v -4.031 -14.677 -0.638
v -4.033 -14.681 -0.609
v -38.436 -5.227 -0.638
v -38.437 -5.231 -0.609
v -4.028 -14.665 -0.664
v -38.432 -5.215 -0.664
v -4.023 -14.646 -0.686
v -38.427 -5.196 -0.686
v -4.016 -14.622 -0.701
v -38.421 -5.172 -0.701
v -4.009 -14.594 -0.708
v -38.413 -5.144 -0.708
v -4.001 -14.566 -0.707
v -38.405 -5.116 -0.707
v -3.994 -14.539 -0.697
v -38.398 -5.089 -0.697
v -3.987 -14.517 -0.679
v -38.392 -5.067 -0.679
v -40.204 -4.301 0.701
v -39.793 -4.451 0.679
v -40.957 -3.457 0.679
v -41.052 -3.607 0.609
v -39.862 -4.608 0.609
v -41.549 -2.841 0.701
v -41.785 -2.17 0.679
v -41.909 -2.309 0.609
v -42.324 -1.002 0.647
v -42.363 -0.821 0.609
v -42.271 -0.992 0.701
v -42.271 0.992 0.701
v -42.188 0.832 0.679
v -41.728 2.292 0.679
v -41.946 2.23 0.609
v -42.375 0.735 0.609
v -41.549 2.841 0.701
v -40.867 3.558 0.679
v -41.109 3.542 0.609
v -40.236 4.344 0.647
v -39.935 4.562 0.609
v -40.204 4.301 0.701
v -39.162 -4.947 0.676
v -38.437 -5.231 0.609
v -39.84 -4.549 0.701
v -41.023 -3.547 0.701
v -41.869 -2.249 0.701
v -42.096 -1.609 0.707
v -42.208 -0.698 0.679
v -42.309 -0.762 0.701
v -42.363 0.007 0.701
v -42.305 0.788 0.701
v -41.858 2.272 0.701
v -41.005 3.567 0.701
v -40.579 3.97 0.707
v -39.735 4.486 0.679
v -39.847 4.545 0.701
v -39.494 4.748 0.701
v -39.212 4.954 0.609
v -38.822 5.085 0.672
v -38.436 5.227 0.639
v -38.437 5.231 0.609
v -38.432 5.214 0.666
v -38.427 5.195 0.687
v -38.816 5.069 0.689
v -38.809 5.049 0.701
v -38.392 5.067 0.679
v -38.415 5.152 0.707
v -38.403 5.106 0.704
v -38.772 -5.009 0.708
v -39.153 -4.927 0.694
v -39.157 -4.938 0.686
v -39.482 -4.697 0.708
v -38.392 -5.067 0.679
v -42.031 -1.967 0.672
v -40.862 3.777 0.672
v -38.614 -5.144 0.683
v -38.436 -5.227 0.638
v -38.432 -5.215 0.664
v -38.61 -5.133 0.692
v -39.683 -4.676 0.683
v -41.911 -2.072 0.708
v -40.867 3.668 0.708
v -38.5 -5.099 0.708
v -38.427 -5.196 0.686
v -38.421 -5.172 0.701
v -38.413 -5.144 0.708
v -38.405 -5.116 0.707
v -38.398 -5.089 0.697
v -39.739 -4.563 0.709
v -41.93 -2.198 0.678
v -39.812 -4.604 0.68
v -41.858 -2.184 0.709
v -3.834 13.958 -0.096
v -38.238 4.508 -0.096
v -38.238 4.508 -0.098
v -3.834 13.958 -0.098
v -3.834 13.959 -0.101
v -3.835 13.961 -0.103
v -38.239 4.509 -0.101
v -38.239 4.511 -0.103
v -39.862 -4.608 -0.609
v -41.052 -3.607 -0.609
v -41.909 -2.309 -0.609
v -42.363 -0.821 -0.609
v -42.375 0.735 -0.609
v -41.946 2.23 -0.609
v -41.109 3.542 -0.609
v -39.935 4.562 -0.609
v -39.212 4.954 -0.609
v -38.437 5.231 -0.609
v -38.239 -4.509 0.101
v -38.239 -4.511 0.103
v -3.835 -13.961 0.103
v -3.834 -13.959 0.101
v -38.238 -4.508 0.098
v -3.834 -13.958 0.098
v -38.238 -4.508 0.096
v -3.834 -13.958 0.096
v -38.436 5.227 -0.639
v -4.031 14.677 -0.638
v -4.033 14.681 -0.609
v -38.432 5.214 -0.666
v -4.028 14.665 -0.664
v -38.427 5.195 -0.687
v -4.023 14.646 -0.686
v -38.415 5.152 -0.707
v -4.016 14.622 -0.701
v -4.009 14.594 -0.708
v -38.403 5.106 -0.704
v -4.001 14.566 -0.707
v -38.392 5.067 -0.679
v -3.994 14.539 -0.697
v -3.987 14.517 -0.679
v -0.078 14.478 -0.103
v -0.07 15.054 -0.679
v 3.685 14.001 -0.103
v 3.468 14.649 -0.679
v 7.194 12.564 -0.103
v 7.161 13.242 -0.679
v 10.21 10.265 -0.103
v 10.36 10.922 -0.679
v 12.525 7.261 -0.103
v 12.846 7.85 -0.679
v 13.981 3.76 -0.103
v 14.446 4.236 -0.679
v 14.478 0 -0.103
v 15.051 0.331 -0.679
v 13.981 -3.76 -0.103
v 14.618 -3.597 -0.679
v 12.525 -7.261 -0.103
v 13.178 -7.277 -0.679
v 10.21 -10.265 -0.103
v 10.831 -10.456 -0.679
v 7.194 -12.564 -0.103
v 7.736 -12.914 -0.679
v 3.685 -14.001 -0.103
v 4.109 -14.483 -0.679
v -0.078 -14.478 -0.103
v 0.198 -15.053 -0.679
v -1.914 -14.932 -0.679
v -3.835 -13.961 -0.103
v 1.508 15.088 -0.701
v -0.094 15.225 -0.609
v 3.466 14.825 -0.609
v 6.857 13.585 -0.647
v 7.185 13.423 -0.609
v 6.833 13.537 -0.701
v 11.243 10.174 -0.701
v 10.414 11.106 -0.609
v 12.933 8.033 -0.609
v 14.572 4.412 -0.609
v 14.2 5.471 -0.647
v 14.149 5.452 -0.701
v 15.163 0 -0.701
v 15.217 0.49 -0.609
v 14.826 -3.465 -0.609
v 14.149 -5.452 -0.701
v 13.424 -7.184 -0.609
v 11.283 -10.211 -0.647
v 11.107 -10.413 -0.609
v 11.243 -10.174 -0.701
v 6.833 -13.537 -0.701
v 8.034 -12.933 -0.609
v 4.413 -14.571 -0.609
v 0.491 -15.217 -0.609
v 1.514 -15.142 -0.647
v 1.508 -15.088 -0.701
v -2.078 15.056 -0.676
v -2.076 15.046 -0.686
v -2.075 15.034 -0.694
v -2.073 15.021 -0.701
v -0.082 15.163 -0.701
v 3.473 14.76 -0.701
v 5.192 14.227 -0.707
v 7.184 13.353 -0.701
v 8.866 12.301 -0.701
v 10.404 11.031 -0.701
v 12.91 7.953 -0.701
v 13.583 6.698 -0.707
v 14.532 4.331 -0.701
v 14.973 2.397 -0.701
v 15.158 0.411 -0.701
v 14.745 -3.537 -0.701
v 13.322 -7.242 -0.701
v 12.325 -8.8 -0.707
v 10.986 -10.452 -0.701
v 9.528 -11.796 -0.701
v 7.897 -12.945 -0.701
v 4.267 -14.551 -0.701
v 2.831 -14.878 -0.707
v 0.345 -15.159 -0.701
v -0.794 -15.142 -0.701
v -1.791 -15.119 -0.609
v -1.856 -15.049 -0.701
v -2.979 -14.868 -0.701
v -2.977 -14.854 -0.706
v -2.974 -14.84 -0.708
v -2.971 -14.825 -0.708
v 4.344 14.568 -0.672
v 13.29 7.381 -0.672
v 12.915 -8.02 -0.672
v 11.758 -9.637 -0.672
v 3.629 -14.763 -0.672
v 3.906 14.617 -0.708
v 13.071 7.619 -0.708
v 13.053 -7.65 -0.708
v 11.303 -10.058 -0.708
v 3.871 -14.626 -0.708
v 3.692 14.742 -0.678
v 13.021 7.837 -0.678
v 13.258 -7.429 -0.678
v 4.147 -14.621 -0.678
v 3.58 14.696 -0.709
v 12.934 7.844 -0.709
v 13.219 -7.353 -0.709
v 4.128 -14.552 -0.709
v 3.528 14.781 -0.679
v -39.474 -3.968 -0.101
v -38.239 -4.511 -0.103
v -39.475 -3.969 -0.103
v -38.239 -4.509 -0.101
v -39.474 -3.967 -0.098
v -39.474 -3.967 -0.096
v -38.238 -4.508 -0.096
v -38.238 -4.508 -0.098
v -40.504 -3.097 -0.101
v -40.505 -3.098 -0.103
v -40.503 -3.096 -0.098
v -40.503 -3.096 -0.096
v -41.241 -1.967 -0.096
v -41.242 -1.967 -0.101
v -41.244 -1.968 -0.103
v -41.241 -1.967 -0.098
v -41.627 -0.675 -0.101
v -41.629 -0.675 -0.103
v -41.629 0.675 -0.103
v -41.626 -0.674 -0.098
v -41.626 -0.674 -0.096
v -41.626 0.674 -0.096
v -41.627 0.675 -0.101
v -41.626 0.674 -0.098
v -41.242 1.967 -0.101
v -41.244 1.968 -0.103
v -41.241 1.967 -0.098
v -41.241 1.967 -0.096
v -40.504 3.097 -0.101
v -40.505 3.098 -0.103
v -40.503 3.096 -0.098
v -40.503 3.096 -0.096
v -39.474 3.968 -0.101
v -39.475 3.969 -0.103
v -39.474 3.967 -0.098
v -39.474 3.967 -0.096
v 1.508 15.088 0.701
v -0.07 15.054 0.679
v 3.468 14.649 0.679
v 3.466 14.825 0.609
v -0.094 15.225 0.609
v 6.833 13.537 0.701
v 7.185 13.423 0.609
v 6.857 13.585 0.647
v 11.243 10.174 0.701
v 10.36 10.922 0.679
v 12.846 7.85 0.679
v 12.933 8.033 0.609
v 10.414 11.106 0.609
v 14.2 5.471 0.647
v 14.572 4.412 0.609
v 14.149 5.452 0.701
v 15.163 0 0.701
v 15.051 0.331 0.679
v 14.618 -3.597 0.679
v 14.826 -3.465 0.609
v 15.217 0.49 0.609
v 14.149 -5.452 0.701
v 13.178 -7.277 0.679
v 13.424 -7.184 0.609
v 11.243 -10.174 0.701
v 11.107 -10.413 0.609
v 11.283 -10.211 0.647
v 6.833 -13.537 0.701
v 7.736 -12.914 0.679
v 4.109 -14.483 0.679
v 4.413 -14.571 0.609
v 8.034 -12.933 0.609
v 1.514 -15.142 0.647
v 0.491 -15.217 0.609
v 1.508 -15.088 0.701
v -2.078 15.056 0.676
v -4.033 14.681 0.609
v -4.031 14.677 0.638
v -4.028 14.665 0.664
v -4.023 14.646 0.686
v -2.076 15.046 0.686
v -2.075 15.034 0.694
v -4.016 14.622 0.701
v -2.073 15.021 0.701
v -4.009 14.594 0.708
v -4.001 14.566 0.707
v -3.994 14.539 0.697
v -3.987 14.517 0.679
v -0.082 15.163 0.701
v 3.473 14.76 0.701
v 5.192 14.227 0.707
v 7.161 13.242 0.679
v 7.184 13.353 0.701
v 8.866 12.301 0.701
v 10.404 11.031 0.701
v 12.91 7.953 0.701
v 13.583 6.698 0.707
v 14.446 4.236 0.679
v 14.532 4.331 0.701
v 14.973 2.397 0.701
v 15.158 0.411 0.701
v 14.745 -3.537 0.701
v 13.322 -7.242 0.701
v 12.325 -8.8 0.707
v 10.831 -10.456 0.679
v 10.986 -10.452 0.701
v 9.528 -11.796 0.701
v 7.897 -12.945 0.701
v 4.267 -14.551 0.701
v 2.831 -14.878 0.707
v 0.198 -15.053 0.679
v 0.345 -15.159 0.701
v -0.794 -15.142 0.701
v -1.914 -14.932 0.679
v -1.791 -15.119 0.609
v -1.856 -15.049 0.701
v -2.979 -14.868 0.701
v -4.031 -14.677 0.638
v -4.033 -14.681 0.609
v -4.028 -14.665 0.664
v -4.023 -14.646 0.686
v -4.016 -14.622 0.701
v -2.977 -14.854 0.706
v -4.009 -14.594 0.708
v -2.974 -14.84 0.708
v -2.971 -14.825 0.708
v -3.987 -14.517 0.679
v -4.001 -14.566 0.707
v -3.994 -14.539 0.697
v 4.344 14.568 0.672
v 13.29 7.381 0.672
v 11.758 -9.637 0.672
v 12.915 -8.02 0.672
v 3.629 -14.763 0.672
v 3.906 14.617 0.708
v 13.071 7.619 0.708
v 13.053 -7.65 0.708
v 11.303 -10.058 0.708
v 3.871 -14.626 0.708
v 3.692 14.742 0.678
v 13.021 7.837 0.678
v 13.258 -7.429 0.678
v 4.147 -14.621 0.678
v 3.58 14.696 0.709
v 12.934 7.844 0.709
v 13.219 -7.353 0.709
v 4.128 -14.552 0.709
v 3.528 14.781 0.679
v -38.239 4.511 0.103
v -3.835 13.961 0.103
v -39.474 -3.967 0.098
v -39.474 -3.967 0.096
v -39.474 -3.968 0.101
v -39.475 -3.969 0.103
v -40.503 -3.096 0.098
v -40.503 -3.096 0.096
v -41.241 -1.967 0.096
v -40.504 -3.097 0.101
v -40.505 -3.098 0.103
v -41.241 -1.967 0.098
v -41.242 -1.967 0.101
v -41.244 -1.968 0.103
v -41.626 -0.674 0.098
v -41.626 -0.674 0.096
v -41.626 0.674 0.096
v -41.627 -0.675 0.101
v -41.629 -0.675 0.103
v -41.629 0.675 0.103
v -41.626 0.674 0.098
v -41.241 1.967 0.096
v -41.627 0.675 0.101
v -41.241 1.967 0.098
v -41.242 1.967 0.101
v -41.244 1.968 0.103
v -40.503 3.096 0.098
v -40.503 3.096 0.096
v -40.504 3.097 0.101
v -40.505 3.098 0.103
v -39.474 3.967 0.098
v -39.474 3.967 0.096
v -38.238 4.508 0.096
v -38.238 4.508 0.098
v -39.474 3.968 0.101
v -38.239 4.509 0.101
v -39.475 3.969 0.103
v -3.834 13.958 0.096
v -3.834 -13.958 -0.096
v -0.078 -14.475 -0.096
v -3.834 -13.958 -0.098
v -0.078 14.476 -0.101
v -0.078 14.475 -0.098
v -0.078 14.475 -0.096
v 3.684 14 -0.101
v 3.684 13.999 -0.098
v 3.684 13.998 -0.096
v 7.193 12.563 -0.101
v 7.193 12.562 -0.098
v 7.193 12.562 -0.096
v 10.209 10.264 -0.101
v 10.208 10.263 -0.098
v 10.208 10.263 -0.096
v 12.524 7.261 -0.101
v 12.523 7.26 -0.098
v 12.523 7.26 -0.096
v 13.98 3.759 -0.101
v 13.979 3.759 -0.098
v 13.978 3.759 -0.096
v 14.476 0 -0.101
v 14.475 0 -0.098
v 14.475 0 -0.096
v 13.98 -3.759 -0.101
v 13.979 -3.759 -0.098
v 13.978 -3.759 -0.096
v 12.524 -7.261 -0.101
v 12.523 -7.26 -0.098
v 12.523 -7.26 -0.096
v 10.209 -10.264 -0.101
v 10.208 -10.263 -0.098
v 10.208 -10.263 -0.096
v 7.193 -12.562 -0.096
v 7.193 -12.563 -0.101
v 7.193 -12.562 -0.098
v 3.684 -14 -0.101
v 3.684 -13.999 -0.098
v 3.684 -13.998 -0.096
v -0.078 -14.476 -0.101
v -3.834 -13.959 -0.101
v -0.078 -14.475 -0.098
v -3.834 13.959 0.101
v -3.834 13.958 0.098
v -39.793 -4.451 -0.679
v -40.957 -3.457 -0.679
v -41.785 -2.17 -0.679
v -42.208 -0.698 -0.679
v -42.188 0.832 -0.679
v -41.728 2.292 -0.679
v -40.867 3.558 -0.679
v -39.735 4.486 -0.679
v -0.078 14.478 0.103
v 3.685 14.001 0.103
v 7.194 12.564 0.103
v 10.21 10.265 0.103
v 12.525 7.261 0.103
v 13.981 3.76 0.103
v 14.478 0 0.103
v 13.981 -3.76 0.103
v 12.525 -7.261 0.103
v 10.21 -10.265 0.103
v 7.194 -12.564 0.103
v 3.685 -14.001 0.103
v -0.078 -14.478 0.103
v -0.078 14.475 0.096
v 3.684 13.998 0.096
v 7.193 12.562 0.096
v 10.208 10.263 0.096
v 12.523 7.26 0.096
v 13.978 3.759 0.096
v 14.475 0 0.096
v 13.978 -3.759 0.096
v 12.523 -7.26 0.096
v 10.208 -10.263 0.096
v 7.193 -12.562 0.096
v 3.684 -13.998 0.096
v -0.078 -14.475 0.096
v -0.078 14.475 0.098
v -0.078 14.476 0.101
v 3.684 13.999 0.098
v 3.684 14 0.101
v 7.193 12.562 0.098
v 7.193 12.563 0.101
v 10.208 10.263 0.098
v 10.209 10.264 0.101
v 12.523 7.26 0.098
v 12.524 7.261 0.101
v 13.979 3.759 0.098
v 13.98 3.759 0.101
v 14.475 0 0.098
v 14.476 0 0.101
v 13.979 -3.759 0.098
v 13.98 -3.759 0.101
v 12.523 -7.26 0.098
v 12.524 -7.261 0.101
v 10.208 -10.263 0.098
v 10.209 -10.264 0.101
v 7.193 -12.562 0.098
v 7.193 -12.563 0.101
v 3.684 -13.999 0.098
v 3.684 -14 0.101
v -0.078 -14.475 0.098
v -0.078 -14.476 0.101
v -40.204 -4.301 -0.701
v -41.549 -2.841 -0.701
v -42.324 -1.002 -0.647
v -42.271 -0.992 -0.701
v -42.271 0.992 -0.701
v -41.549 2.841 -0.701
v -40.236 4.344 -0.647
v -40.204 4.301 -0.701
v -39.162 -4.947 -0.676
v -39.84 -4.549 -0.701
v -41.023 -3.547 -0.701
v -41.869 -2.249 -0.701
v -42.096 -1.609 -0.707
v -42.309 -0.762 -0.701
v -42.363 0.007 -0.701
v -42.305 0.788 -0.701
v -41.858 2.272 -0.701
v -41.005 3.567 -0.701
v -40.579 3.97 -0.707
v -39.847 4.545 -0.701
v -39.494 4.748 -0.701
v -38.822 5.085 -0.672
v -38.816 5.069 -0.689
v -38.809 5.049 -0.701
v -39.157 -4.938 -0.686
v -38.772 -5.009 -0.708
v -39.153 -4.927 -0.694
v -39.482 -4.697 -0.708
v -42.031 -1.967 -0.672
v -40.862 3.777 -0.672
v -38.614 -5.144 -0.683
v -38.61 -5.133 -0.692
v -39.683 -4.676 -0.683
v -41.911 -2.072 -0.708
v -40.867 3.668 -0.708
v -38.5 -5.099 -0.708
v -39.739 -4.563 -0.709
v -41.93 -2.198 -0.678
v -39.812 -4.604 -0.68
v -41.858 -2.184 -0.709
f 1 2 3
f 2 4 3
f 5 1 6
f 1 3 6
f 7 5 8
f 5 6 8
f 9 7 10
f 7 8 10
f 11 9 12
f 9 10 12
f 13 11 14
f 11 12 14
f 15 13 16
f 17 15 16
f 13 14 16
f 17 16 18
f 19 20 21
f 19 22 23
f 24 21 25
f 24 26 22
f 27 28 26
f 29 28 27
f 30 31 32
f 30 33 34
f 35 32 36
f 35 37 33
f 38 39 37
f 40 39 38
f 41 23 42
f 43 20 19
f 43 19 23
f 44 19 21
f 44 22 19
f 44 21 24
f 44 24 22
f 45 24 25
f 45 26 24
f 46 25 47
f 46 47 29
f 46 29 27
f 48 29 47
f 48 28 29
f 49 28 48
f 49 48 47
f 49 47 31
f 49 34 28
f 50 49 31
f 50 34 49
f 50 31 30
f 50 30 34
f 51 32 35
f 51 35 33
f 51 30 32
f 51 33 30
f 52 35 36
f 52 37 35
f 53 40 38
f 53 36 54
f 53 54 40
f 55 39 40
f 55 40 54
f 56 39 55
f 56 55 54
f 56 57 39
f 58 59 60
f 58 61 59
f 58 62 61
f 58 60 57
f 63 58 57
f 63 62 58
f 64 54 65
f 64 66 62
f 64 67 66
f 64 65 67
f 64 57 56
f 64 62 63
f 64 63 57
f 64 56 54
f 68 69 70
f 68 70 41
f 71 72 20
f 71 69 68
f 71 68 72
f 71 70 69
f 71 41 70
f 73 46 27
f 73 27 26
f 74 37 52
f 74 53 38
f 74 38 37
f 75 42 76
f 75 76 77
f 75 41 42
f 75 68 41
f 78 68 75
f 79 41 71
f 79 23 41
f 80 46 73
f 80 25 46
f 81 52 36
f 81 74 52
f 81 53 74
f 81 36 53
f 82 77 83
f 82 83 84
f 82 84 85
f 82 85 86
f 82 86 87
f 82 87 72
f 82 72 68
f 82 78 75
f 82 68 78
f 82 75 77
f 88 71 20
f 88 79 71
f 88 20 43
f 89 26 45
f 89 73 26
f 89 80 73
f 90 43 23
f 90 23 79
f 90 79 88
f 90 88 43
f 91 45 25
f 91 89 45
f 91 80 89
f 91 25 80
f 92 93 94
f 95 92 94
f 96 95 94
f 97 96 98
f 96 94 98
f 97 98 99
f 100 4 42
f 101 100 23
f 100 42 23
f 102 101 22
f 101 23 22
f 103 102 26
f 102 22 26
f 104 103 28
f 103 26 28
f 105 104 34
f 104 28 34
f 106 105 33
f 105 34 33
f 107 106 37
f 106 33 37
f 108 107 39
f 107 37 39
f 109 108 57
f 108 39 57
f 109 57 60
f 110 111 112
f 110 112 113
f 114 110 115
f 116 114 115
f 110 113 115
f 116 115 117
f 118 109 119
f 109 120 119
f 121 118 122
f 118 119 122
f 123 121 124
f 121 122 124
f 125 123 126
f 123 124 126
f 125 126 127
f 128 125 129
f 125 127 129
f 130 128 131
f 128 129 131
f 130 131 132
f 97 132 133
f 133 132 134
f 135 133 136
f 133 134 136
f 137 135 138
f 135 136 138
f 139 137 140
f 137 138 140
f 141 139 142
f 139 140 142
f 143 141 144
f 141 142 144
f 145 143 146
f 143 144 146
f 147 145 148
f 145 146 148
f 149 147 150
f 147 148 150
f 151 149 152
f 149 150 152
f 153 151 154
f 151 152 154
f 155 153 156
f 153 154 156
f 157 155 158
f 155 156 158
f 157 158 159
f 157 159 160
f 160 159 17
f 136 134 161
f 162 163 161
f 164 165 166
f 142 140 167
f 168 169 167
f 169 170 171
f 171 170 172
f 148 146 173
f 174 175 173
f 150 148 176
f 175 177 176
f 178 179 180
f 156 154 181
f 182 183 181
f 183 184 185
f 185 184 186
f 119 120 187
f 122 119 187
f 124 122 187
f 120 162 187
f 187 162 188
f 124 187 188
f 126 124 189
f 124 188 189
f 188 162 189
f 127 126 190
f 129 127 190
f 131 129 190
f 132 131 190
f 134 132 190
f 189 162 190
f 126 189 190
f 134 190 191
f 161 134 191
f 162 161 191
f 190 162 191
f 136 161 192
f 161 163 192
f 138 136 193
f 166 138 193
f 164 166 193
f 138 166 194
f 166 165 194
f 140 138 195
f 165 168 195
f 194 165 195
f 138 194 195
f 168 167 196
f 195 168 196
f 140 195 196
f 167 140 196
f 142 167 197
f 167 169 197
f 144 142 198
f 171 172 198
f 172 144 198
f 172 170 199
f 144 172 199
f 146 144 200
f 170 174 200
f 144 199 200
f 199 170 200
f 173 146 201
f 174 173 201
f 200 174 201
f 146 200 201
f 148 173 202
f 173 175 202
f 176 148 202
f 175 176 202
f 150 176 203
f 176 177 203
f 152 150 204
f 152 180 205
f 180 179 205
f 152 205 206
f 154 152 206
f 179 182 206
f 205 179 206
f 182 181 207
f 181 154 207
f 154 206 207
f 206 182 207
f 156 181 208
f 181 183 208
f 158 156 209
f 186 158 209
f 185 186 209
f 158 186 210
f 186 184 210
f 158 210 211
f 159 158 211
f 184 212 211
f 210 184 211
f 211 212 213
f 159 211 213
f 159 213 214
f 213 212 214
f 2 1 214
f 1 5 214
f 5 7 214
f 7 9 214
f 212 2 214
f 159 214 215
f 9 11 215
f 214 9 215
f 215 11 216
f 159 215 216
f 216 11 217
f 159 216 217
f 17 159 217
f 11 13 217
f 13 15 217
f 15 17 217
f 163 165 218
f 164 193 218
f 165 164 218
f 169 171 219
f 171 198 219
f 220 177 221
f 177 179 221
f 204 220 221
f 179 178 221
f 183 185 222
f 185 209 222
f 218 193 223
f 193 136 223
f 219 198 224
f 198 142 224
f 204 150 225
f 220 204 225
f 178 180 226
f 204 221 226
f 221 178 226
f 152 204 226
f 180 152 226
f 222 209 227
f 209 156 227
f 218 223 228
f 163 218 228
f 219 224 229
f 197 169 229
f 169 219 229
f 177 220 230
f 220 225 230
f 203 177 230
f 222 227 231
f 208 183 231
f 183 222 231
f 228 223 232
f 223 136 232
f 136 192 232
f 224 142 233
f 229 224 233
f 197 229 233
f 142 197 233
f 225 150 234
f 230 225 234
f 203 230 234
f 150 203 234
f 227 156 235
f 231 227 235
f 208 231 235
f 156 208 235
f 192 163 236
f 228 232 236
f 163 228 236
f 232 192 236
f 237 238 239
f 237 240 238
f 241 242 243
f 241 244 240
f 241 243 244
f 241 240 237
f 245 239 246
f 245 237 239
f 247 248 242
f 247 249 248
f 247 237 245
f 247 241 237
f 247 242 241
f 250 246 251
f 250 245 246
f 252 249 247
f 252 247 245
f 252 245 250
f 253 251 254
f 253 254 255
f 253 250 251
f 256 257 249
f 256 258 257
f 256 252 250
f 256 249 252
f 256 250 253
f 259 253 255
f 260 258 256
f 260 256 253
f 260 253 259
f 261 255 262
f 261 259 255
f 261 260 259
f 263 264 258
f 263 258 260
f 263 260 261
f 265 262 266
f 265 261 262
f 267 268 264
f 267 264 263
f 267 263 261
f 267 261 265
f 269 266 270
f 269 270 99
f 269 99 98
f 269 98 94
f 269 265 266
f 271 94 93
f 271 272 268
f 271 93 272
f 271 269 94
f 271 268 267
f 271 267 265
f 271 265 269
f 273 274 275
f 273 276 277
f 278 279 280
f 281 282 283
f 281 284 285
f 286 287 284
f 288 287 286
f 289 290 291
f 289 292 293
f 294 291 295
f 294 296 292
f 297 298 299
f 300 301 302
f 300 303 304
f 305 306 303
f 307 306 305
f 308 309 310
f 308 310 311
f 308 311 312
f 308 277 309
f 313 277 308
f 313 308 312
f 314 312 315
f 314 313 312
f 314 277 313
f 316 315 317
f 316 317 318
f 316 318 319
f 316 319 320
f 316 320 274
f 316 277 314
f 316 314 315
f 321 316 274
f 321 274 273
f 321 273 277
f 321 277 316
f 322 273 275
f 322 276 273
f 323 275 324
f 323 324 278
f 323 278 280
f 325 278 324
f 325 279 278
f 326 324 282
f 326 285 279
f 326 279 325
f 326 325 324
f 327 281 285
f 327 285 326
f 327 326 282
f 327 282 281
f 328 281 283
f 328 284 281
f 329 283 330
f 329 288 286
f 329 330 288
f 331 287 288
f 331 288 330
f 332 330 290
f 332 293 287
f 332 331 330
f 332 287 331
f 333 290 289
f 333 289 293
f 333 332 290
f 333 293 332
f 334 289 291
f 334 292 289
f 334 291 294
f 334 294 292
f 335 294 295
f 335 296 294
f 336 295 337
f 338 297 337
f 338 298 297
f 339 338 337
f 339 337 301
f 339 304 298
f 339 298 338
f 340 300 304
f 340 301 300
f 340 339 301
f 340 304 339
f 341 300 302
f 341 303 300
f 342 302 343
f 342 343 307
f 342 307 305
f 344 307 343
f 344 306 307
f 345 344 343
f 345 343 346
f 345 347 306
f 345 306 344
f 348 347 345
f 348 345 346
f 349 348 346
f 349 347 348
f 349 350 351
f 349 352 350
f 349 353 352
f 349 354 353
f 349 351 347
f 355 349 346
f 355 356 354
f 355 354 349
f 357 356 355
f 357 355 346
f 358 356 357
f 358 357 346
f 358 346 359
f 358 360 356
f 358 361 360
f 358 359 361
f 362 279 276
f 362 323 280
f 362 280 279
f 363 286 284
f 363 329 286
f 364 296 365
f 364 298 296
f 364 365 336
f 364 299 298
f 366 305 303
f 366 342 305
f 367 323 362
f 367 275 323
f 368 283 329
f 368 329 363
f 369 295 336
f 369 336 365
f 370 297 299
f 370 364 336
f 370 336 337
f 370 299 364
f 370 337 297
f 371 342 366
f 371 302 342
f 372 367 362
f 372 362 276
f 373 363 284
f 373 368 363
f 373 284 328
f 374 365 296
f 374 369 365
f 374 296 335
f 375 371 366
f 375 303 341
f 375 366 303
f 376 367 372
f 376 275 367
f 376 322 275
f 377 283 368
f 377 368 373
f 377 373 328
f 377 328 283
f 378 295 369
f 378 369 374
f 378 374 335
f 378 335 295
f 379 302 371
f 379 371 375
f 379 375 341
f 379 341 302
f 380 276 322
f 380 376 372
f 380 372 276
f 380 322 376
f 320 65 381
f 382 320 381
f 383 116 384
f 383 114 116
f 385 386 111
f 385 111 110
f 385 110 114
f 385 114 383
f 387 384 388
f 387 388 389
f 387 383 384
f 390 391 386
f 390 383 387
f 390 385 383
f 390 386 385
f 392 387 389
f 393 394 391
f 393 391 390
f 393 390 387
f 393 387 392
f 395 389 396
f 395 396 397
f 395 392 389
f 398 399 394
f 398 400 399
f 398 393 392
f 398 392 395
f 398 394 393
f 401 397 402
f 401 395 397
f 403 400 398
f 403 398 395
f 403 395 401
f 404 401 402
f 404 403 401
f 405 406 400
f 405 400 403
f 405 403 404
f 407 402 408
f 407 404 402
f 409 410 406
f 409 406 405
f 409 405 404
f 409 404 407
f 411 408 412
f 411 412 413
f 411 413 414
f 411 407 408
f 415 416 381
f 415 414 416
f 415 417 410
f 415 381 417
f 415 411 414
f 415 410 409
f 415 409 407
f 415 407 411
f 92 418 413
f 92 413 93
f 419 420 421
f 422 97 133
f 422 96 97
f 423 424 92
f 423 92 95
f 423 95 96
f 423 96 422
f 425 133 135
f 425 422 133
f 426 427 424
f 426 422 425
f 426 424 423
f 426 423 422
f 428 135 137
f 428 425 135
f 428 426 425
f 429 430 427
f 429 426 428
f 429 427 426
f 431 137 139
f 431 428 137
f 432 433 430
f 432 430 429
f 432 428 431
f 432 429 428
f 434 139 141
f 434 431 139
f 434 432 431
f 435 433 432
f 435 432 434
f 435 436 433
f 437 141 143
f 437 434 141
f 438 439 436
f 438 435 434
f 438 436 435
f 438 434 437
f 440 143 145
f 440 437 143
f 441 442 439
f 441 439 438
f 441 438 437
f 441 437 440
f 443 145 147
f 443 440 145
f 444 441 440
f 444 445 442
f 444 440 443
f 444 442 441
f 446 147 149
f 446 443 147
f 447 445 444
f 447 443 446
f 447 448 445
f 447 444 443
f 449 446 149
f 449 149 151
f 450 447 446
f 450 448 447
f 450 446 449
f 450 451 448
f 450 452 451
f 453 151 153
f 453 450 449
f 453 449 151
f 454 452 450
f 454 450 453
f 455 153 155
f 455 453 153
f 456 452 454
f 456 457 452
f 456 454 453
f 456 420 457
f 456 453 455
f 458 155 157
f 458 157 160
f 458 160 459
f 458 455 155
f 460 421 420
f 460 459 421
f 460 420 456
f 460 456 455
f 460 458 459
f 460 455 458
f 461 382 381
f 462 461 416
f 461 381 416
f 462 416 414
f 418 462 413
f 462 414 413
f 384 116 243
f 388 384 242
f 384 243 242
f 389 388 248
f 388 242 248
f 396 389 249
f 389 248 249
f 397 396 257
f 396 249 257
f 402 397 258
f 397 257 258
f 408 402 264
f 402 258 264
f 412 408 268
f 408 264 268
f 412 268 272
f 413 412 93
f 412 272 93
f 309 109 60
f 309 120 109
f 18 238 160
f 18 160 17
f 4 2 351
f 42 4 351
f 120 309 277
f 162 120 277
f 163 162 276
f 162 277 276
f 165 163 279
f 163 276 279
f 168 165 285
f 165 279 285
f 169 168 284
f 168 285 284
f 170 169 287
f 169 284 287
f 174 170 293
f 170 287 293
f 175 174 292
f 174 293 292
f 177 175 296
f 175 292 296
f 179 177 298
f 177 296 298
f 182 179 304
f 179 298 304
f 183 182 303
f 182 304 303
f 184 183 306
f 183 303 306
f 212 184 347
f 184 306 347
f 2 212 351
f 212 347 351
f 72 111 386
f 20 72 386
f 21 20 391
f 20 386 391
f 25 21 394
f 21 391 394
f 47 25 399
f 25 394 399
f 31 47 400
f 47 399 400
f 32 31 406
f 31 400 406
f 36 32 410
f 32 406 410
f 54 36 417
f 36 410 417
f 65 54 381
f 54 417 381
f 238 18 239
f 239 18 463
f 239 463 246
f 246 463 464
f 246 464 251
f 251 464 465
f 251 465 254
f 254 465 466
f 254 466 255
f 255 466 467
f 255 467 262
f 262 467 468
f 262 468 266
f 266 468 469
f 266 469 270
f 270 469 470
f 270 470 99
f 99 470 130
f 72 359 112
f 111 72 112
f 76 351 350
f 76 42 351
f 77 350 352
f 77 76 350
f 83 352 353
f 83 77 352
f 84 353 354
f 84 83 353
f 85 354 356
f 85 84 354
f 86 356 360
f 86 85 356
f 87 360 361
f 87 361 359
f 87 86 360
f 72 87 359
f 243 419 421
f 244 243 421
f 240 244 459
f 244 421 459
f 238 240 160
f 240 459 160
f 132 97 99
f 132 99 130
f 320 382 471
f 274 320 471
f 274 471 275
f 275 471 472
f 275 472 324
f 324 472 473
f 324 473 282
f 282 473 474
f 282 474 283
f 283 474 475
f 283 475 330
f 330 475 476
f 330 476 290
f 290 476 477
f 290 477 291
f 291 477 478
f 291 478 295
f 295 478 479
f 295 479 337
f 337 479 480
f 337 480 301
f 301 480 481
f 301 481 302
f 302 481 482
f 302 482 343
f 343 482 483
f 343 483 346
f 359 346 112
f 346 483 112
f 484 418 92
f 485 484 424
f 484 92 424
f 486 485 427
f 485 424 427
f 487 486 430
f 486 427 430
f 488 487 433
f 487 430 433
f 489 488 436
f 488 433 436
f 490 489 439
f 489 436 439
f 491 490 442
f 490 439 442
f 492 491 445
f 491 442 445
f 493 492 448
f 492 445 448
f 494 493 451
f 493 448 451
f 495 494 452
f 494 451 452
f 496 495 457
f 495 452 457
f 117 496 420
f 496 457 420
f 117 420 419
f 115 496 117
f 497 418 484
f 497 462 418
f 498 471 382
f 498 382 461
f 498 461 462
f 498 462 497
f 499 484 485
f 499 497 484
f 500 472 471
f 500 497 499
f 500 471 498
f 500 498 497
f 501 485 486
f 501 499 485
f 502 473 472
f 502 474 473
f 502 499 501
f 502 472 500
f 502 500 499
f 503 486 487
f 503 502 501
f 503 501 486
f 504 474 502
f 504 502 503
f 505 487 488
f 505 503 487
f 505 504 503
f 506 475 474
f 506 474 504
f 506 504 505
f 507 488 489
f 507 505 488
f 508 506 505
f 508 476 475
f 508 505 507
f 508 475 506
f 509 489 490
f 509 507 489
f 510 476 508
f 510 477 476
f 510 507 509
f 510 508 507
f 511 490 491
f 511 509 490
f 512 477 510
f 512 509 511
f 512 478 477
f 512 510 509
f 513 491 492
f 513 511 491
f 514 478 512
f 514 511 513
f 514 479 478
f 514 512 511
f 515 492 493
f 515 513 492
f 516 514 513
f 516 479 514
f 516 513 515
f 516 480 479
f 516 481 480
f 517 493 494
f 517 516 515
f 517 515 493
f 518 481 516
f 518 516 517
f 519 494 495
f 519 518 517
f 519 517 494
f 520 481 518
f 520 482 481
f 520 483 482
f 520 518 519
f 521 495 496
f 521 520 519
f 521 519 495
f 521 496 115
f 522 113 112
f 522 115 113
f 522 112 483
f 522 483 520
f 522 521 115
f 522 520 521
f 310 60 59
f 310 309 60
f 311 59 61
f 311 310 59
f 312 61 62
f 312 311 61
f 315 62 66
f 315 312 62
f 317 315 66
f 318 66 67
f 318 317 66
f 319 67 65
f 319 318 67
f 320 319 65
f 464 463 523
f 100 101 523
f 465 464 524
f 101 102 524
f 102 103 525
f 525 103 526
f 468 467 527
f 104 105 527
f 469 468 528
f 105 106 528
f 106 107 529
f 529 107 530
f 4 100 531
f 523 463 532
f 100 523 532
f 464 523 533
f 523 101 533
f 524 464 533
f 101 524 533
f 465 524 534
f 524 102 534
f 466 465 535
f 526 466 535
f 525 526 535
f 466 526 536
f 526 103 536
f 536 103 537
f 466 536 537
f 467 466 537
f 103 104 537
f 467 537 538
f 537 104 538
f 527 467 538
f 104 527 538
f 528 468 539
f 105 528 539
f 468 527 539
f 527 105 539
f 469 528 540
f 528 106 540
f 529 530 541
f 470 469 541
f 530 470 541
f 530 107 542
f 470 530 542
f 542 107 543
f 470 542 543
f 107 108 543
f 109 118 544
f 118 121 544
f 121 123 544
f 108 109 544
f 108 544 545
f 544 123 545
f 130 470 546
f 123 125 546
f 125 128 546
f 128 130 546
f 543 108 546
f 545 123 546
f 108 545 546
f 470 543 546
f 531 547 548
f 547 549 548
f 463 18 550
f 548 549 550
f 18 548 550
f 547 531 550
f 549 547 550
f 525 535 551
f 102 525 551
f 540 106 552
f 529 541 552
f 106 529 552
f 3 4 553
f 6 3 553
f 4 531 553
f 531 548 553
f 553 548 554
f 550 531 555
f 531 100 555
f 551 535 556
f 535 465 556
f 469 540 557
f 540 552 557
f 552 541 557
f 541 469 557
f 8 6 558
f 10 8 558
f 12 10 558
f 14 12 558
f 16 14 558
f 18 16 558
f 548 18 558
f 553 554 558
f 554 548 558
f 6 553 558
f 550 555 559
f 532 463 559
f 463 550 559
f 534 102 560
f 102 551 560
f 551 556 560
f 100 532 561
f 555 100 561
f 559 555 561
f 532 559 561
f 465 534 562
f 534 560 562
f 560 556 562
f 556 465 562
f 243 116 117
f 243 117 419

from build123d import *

# Parameters (mm, degrees)
FILLET1_R = 0.1
FILLET2_R = 0.01


with BuildPart() as part:
    # Sweep1: sweep along a path in Sketch2
    with BuildLine(Plane.XY) as sweep1_path:
        Line((-38.238243243, 4.508034901), (-3.833918919, 13.958033197))
        ThreePointArc((-3.833918919, 13.958033197), (14.475, 0), (-3.833918919, -13.958033197))
        Line((-3.833918919, -13.958033197), (-38.238243243, -4.508034901))
        ThreePointArc((-38.238243243, -4.508034901), (-41.675, 0), (-38.238243243, 4.508034901))
    # Sketch3 → Sweep1 (sweep)
    with BuildSketch(Plane(origin=(0, 0, 0), x_dir=(1, 0, 0), z_dir=(0, 1, 0))):
        Polygon((-42.425, 0.85), (-42.425, -0.85), (-41.675, -0.1), (-41.675, 0.1), align=None)
    sweep(path=sweep1_path.line)

    # Fillet1
    fillet1_edges = [part.edges().sort_by_distance(p)[0] for p in [
        (-21.23472973, -9.956248204, -0.85),
        (-21.23472973, -9.956248204, 0.85),
        (-42.425, 0, -0.85),
        (-42.425, 0, 0.85),
        (-42.425, 0, -0.85),
        (-42.425, 0, 0.85),
        (-21.23472973, 9.956248204, -0.85),
        (-21.23472973, 9.956248204, 0.85),
        (15.225, 0, -0.85),
        (15.225, 0, 0.85),
    ]]
    fillet(fillet1_edges, radius=FILLET1_R)

    # Fillet2
    # the kernel refuses this fillet: 0.01 mm, written as the material it takes off along each edge
    with BuildSketch(Plane(origin=(-3.833918919, -13.958033197, 0.1), x_dir=(-0.18728774204254256, -0.6818528445936296, 0.707106781186676), z_dir=(-0.9642855403669122, 0.26486486486374966, 9.376666110227916e-13)), Plane(origin=(-38.238243243, 4.508034901, 0.1), x_dir=(-0.18728774204547696, 0.681852844593033, 0.7071067811864742), z_dir=(0.9642855403662898, 0.26486486486601535, 9.378886556277166e-13))) as fillet2_piece_1:
        with BuildLine():
            CenterArc((FILLET2_R * 0.414213562373, -FILLET2_R), FILLET2_R, 90, 45)
            Line((-FILLET2_R * 0.292893218814, -FILLET2_R * 0.292893218813), (0, 0))
            Line((0, 0), (FILLET2_R * 0.414213562373, 0))
        make_face()
    extrude(amount=35.678564994, mode=Mode.SUBTRACT)
    with BuildSketch(Plane(origin=(-37, 0, -0.1), x_dir=(-0.26486486486465444, -0.9642855403666637, 0), z_dir=(0.9642855403666637, -0.26486486486465444, 0))) as fillet2_piece_2:
        with BuildLine():
            CenterArc((4.675 + FILLET2_R, -FILLET2_R * 0.414213562373), FILLET2_R, 135, 45)
            Line((4.675, -FILLET2_R * 0.414213562373), (4.675, 0))
            Line((4.675, 0), (4.675 + FILLET2_R * 0.292893218813, FILLET2_R * 0.292893218813))
        make_face()
    revolve(axis=Axis((-37, 0, -0.1), (0, 0, -1)), revolution_arc=149.282153594, mode=Mode.SUBTRACT)
    with BuildSketch(Plane(origin=(-37, 0, 0.1), x_dir=(-0.264864864864405, -0.9642855403667321, 0), z_dir=(0.9642855403667321, -0.264864864864405, 0))) as fillet2_piece_3:
        with BuildLine():
            CenterArc((4.675 + FILLET2_R, FILLET2_R * 0.414213562373), FILLET2_R, 180, 45)
            Line((4.675, FILLET2_R * 0.414213562373), (4.675, 0))
            Line((4.675, 0), (4.675 + FILLET2_R * 0.292893218813, -FILLET2_R * 0.292893218814))
        make_face()
    revolve(axis=Axis((-37, 0, 0.1), (0, 0, -1)), revolution_arc=149.282153594, mode=Mode.SUBTRACT)
    with BuildSketch(Plane(origin=(-38.238243243, 4.508034901, -0.1), x_dir=(-0.18728774204415874, 0.6818528445932414, -0.7071067811866223), z_dir=(0.9642855403665382, 0.264864864865111, 0)), Plane(origin=(-3.833918919, -13.958033197, -0.1), x_dir=(-0.1872877420438419, -0.6818528445933534, -0.7071067811865981), z_dir=(-0.9642855403666637, 0.2648648648646539, 0))) as fillet2_piece_4:
        with BuildLine():
            CenterArc((FILLET2_R * 0.414213562373, FILLET2_R), FILLET2_R, 225, 45)
            Line((-FILLET2_R * 0.292893218813, FILLET2_R * 0.292893218813), (0, 0))
            Line((0, 0), (FILLET2_R * 0.414213562373, 0))
        make_face()
    extrude(amount=35.678564994, mode=Mode.SUBTRACT)
    with BuildSketch(Plane(origin=(0, 0, -0.1), x_dir=(-0.2648648648651112, 0.9642855403665381, 0), z_dir=(-0.9642855403665381, -0.2648648648651112, 0))) as fillet2_piece_5:
        with BuildLine():
            CenterArc((14.475 + FILLET2_R, -FILLET2_R * 0.414213562373), FILLET2_R, 135, 45)
            Line((14.475, -FILLET2_R * 0.414213562373), (14.475, 0))
            Line((14.475, 0), (14.475 + FILLET2_R * 0.292893218814, FILLET2_R * 0.292893218813))
        make_face()
    revolve(axis=Axis((0, 0, -0.1), (0, 0, -1)), revolution_arc=210.717846406, mode=Mode.SUBTRACT)
    with BuildSketch(Plane(origin=(0, 0, 0.1), x_dir=(-0.2648648648652003, 0.9642855403665136, 0), z_dir=(-0.9642855403665136, -0.2648648648652003, 0))) as fillet2_piece_6:
        with BuildLine():
            CenterArc((14.475 + FILLET2_R, FILLET2_R * 0.414213562373), FILLET2_R, 180, 45)
            Line((14.475, FILLET2_R * 0.414213562373), (14.475, 0))
            Line((14.475, 0), (14.475 + FILLET2_R * 0.292893218814, -FILLET2_R * 0.292893218814))
        make_face()
    revolve(axis=Axis((0, 0, 0.1), (0, 0, -1)), revolution_arc=210.717846406, mode=Mode.SUBTRACT)


solid = part.part
